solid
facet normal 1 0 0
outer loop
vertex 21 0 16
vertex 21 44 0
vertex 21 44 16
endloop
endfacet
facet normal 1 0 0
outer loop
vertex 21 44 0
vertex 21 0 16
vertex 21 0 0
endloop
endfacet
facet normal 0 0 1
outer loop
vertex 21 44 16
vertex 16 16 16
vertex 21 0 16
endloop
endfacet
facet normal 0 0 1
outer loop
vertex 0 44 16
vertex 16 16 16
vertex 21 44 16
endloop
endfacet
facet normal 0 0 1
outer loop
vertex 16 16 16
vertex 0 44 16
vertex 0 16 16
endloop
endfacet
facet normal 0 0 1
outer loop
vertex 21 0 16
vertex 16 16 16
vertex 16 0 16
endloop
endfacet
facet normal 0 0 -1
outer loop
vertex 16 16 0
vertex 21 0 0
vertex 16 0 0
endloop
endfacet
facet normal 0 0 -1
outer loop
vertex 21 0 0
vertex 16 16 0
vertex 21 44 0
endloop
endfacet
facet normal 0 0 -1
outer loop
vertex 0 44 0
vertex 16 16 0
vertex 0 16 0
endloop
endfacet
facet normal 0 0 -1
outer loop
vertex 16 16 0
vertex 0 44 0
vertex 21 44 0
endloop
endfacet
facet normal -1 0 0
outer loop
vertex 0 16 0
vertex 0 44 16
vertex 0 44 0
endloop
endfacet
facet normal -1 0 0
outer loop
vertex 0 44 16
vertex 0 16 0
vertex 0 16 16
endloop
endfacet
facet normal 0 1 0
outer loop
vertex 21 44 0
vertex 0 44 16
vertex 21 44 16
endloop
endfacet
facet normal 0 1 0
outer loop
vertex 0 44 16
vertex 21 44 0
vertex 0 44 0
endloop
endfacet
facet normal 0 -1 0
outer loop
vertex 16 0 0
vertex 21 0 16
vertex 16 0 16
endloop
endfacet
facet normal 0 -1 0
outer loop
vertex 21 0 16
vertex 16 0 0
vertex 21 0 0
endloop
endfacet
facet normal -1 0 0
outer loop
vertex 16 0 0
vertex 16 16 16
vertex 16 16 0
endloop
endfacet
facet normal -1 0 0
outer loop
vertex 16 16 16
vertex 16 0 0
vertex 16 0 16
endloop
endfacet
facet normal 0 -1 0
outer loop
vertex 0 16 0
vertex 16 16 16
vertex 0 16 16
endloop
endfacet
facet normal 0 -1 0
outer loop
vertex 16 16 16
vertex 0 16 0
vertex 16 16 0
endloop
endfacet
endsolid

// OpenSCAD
difference() {
  cube([16+5,16+28,16]);
  //cube([16+5,16+10,16]);
  cube([16,16,16]);
}
